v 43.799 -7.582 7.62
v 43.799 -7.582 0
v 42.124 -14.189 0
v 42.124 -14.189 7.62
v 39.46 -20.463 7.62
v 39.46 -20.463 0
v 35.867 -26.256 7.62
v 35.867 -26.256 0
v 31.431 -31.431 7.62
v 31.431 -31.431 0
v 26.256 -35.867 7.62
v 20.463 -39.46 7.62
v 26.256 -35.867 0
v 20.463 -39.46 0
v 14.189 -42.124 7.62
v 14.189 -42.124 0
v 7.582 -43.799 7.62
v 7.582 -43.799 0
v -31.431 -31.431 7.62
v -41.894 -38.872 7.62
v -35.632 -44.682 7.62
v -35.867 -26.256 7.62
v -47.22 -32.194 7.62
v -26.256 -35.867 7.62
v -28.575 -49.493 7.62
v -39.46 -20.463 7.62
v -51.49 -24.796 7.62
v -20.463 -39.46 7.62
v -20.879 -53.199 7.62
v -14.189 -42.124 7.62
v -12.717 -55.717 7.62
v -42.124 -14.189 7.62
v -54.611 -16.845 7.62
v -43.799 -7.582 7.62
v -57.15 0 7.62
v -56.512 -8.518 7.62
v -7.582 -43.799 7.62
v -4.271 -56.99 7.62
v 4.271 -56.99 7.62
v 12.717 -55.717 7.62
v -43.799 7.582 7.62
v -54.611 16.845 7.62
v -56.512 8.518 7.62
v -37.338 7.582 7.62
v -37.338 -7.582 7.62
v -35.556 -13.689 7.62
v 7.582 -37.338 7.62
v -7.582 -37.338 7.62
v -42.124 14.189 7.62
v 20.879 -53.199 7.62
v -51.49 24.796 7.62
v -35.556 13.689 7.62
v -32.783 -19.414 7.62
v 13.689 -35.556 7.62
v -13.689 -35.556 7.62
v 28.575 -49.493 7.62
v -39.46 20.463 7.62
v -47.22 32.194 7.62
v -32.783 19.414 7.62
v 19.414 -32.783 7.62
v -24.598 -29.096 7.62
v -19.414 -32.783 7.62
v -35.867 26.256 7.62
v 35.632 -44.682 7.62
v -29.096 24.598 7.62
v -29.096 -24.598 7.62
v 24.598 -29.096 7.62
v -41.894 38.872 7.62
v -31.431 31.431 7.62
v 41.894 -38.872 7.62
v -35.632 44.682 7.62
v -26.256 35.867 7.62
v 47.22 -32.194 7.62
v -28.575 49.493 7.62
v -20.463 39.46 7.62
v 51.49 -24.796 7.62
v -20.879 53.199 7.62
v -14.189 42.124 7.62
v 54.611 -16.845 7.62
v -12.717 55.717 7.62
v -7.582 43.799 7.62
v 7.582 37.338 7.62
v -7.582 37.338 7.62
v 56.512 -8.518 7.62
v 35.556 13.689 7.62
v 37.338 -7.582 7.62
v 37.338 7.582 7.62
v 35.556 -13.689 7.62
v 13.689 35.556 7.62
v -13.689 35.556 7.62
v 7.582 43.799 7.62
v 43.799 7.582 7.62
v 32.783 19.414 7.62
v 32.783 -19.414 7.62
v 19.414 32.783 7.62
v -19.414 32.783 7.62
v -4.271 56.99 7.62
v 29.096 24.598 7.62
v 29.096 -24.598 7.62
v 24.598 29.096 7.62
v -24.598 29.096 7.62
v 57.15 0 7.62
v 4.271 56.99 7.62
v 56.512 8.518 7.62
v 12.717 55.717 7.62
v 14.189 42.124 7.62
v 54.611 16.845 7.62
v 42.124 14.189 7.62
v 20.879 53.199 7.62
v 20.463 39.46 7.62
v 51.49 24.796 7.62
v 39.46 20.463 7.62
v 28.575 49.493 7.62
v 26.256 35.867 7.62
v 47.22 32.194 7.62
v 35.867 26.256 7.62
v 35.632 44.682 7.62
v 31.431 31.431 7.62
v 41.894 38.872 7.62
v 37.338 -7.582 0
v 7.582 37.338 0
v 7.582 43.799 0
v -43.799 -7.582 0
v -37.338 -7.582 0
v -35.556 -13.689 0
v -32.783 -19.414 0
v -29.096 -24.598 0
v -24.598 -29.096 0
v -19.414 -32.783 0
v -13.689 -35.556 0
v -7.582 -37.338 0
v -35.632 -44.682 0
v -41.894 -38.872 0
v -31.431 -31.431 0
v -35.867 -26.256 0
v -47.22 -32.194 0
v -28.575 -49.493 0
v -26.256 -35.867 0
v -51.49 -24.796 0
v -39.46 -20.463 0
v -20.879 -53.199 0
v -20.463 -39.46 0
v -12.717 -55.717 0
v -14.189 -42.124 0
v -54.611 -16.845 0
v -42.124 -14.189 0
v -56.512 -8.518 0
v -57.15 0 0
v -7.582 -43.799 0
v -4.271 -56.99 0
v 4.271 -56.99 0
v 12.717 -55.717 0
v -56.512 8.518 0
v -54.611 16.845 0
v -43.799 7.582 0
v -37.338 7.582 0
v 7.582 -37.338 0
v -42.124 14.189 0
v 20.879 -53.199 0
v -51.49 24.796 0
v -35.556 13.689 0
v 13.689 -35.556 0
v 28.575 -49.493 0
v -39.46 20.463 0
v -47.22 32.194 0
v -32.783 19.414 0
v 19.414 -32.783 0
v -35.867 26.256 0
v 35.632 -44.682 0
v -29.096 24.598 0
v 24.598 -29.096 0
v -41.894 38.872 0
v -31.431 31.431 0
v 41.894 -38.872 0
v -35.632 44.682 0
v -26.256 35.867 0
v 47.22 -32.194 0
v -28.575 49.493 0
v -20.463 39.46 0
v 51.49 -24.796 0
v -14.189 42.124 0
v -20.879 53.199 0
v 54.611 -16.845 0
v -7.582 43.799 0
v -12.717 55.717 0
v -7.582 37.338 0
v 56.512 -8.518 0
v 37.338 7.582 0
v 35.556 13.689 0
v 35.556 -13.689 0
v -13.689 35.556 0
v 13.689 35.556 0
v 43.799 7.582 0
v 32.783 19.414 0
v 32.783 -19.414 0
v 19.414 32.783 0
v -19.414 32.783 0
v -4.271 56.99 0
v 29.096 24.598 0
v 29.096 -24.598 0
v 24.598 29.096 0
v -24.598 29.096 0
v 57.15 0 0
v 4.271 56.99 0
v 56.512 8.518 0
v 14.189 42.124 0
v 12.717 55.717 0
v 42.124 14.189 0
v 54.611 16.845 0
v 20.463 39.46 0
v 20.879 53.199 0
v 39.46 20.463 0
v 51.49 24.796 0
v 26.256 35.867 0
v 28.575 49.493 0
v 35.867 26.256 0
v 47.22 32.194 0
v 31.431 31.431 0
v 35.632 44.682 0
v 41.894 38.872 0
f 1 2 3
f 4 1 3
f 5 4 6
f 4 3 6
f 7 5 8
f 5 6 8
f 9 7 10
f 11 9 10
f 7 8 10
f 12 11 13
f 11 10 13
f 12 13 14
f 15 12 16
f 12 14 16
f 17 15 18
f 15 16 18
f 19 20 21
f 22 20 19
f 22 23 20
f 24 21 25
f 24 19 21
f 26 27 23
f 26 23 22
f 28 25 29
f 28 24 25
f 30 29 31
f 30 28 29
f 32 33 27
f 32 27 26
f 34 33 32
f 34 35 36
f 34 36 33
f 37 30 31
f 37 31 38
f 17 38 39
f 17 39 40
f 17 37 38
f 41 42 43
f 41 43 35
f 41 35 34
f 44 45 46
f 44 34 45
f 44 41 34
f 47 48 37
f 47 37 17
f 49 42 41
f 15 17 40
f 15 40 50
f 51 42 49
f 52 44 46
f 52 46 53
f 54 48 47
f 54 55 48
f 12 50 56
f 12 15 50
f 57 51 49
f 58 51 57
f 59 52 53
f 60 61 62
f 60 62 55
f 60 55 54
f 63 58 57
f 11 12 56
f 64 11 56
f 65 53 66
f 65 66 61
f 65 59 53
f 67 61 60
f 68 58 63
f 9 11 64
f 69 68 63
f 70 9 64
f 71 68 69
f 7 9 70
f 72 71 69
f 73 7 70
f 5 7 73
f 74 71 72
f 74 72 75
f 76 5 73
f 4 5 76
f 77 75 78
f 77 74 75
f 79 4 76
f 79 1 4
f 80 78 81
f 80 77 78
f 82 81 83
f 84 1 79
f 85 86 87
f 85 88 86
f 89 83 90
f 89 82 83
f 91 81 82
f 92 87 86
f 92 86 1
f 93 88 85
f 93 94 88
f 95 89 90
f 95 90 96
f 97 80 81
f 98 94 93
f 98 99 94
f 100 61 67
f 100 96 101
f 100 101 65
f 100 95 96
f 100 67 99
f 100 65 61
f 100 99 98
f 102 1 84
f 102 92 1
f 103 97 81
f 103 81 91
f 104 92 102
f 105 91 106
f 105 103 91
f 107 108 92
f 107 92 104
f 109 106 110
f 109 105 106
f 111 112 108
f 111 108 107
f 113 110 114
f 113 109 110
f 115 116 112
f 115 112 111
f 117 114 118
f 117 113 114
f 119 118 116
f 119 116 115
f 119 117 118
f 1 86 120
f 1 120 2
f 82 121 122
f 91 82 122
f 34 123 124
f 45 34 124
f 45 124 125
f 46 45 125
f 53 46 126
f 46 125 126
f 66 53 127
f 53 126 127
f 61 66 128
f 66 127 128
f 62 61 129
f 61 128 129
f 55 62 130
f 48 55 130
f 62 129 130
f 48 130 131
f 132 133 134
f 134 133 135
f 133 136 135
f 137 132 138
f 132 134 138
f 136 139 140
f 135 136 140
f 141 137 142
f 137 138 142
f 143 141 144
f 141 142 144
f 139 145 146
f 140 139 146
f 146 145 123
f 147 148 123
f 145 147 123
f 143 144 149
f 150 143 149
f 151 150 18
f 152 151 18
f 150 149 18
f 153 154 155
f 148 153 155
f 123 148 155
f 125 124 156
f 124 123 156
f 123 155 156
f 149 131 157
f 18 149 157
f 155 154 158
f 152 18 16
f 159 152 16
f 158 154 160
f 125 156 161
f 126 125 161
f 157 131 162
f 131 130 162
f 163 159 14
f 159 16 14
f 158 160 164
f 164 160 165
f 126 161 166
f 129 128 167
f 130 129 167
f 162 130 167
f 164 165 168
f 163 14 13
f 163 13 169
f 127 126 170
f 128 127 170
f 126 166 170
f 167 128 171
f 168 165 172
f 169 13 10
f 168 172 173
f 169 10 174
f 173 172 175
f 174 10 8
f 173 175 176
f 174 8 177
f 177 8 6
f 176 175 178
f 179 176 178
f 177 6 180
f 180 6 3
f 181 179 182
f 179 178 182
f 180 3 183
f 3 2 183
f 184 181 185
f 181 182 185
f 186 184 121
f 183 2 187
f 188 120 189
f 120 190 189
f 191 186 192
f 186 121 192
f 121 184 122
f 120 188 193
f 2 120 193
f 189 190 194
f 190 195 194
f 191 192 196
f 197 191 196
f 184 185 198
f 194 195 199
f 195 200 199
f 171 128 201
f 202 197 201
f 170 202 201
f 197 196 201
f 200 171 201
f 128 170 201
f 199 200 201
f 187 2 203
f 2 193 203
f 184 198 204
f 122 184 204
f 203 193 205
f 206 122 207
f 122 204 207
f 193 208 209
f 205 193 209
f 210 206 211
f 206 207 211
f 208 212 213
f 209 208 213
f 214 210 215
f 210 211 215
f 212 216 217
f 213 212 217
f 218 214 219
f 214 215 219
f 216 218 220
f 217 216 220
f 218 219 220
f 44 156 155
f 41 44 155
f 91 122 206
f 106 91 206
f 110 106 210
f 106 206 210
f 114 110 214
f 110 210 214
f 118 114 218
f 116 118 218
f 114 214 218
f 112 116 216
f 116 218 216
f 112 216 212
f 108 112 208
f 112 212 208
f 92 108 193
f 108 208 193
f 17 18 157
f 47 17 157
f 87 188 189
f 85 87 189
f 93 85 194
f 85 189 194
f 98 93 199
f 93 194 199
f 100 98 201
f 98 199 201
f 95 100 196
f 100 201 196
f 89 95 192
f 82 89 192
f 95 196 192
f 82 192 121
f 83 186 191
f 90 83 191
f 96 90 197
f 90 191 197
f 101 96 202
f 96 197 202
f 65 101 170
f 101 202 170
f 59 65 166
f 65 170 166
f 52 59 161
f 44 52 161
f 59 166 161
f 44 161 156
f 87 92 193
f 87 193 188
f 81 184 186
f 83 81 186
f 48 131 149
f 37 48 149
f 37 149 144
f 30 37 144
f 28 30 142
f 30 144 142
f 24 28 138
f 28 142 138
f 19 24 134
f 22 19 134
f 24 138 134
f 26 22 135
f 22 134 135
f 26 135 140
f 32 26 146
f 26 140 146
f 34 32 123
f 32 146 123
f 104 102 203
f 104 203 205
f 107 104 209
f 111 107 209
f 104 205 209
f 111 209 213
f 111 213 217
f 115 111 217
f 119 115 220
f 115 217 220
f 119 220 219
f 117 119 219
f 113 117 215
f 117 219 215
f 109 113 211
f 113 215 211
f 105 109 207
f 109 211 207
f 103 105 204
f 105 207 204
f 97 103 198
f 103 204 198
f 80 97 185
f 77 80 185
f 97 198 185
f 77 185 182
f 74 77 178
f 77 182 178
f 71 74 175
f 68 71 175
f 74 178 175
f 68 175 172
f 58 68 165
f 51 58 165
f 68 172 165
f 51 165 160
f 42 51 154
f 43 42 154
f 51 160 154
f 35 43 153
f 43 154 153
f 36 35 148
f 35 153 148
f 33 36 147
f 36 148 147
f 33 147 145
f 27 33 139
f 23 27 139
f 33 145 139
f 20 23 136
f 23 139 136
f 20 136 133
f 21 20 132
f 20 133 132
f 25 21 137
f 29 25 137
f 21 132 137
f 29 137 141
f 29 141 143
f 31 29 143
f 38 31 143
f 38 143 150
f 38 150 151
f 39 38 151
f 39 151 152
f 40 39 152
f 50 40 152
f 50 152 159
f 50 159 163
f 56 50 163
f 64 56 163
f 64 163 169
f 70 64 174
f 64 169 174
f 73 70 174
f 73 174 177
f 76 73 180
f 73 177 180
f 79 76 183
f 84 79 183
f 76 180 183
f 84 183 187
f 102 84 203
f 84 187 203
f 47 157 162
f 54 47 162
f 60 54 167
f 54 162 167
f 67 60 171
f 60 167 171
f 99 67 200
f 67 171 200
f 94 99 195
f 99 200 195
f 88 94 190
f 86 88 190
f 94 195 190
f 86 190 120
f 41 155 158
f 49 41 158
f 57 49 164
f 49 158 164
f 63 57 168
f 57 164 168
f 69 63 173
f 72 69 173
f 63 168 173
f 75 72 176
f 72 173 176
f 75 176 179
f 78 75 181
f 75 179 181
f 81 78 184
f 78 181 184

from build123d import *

# Parameters (mm, degrees)
F0_R     = 57.15
F1_DEPTH = 7.62


with BuildPart() as f1:
    # F0 (on Top) → F1 (new body)
    with BuildSketch(Plane.XY):
        Circle(F0_R)
        with BuildLine():
            ThreePointArc((7.581804, 43.798616), (31.430896, 31.430896), (43.798616, 7.581804))
            ThreePointArc((43.798616, 7.581804), (44.286855, 3.804867), (44.45, 0))
            ThreePointArc((44.45, 0), (44.286855, -3.804867), (43.798616, -7.581804))
            ThreePointArc((43.798616, -7.581804), (31.430896, -31.430896), (7.581804, -43.798616))
            ThreePointArc((7.581804, -43.798616), (0, -44.45), (-7.581804, -43.798616))
            ThreePointArc((-7.581804, -43.798616), (-31.430896, -31.430896), (-43.798616, -7.581804))
            ThreePointArc((-43.798616, -7.581804), (-44.45, 0), (-43.798616, 7.581804))
            ThreePointArc((-43.798616, 7.581804), (-31.430896, 31.430896), (-7.581804, 43.798616))
            ThreePointArc((-7.581804, 43.798616), (0, 44.45), (7.581804, 43.798616))
        make_face(mode=Mode.SUBTRACT)
        with BuildLine():
            ThreePointArc((37.338, -7.581804), (37.909021, -3.81), (38.1, 0))
            ThreePointArc((38.1, 0), (37.909021, 3.81), (37.338, 7.581804))
            ThreePointArc((37.338, 7.581804), (26.940768, 26.940768), (7.581804, 37.338))
            ThreePointArc((7.581804, 37.338), (0, 38.1), (-7.581804, 37.338))
            ThreePointArc((-7.581804, 37.338), (-26.940768, 26.940768), (-37.338, 7.581804))
            ThreePointArc((-37.338, 7.581804), (-38.1, 0), (-37.338, -7.581804))
            ThreePointArc((-37.338, -7.581804), (-26.940768, -26.940768), (-7.581804, -37.338))
            ThreePointArc((-7.581804, -37.338), (0, -38.1), (7.581804, -37.338))
            ThreePointArc((7.581804, -37.338), (26.940768, -26.940768), (37.338, -7.581804))
        make_face()
        with BuildLine():
            ThreePointArc((-7.581804, 37.338), (0, 38.1), (7.581804, 37.338))
            Line((7.581804, 37.338), (7.581804, 43.798616))
            ThreePointArc((7.581804, 43.798616), (0, 44.45), (-7.581804, 43.798616))
            Line((-7.581804, 43.798616), (-7.581804, 37.338))
        make_face()
        with BuildLine():
            ThreePointArc((37.338, 7.581804), (37.909021, 3.81), (38.1, 0))
            ThreePointArc((38.1, 0), (37.909021, -3.81), (37.338, -7.581804))
            Line((37.338, -7.581804), (43.798616, -7.581804))
            ThreePointArc((43.798616, -7.581804), (44.286855, -3.804867), (44.45, 0))
            ThreePointArc((44.45, 0), (44.286855, 3.804867), (43.798616, 7.581804))
            Line((43.798616, 7.581804), (37.338, 7.581804))
        make_face()
        with BuildLine():
            Line((7.581804, -43.798616), (7.581804, -37.338))
            ThreePointArc((7.581804, -37.338), (0, -38.1), (-7.581804, -37.338))
            Line((-7.581804, -37.338), (-7.581804, -43.798616))
            ThreePointArc((-7.581804, -43.798616), (0, -44.45), (7.581804, -43.798616))
        make_face()
        with BuildLine():
            ThreePointArc((-37.338, -7.581804), (-38.1, 0), (-37.338, 7.581804))
            Line((-37.338, 7.581804), (-43.798616, 7.581804))
            ThreePointArc((-43.798616, 7.581804), (-44.45, 0), (-43.798616, -7.581804))
            Line((-43.798616, -7.581804), (-37.338, -7.581804))
        make_face()
    extrude(amount=F1_DEPTH)


solid = f1.part
